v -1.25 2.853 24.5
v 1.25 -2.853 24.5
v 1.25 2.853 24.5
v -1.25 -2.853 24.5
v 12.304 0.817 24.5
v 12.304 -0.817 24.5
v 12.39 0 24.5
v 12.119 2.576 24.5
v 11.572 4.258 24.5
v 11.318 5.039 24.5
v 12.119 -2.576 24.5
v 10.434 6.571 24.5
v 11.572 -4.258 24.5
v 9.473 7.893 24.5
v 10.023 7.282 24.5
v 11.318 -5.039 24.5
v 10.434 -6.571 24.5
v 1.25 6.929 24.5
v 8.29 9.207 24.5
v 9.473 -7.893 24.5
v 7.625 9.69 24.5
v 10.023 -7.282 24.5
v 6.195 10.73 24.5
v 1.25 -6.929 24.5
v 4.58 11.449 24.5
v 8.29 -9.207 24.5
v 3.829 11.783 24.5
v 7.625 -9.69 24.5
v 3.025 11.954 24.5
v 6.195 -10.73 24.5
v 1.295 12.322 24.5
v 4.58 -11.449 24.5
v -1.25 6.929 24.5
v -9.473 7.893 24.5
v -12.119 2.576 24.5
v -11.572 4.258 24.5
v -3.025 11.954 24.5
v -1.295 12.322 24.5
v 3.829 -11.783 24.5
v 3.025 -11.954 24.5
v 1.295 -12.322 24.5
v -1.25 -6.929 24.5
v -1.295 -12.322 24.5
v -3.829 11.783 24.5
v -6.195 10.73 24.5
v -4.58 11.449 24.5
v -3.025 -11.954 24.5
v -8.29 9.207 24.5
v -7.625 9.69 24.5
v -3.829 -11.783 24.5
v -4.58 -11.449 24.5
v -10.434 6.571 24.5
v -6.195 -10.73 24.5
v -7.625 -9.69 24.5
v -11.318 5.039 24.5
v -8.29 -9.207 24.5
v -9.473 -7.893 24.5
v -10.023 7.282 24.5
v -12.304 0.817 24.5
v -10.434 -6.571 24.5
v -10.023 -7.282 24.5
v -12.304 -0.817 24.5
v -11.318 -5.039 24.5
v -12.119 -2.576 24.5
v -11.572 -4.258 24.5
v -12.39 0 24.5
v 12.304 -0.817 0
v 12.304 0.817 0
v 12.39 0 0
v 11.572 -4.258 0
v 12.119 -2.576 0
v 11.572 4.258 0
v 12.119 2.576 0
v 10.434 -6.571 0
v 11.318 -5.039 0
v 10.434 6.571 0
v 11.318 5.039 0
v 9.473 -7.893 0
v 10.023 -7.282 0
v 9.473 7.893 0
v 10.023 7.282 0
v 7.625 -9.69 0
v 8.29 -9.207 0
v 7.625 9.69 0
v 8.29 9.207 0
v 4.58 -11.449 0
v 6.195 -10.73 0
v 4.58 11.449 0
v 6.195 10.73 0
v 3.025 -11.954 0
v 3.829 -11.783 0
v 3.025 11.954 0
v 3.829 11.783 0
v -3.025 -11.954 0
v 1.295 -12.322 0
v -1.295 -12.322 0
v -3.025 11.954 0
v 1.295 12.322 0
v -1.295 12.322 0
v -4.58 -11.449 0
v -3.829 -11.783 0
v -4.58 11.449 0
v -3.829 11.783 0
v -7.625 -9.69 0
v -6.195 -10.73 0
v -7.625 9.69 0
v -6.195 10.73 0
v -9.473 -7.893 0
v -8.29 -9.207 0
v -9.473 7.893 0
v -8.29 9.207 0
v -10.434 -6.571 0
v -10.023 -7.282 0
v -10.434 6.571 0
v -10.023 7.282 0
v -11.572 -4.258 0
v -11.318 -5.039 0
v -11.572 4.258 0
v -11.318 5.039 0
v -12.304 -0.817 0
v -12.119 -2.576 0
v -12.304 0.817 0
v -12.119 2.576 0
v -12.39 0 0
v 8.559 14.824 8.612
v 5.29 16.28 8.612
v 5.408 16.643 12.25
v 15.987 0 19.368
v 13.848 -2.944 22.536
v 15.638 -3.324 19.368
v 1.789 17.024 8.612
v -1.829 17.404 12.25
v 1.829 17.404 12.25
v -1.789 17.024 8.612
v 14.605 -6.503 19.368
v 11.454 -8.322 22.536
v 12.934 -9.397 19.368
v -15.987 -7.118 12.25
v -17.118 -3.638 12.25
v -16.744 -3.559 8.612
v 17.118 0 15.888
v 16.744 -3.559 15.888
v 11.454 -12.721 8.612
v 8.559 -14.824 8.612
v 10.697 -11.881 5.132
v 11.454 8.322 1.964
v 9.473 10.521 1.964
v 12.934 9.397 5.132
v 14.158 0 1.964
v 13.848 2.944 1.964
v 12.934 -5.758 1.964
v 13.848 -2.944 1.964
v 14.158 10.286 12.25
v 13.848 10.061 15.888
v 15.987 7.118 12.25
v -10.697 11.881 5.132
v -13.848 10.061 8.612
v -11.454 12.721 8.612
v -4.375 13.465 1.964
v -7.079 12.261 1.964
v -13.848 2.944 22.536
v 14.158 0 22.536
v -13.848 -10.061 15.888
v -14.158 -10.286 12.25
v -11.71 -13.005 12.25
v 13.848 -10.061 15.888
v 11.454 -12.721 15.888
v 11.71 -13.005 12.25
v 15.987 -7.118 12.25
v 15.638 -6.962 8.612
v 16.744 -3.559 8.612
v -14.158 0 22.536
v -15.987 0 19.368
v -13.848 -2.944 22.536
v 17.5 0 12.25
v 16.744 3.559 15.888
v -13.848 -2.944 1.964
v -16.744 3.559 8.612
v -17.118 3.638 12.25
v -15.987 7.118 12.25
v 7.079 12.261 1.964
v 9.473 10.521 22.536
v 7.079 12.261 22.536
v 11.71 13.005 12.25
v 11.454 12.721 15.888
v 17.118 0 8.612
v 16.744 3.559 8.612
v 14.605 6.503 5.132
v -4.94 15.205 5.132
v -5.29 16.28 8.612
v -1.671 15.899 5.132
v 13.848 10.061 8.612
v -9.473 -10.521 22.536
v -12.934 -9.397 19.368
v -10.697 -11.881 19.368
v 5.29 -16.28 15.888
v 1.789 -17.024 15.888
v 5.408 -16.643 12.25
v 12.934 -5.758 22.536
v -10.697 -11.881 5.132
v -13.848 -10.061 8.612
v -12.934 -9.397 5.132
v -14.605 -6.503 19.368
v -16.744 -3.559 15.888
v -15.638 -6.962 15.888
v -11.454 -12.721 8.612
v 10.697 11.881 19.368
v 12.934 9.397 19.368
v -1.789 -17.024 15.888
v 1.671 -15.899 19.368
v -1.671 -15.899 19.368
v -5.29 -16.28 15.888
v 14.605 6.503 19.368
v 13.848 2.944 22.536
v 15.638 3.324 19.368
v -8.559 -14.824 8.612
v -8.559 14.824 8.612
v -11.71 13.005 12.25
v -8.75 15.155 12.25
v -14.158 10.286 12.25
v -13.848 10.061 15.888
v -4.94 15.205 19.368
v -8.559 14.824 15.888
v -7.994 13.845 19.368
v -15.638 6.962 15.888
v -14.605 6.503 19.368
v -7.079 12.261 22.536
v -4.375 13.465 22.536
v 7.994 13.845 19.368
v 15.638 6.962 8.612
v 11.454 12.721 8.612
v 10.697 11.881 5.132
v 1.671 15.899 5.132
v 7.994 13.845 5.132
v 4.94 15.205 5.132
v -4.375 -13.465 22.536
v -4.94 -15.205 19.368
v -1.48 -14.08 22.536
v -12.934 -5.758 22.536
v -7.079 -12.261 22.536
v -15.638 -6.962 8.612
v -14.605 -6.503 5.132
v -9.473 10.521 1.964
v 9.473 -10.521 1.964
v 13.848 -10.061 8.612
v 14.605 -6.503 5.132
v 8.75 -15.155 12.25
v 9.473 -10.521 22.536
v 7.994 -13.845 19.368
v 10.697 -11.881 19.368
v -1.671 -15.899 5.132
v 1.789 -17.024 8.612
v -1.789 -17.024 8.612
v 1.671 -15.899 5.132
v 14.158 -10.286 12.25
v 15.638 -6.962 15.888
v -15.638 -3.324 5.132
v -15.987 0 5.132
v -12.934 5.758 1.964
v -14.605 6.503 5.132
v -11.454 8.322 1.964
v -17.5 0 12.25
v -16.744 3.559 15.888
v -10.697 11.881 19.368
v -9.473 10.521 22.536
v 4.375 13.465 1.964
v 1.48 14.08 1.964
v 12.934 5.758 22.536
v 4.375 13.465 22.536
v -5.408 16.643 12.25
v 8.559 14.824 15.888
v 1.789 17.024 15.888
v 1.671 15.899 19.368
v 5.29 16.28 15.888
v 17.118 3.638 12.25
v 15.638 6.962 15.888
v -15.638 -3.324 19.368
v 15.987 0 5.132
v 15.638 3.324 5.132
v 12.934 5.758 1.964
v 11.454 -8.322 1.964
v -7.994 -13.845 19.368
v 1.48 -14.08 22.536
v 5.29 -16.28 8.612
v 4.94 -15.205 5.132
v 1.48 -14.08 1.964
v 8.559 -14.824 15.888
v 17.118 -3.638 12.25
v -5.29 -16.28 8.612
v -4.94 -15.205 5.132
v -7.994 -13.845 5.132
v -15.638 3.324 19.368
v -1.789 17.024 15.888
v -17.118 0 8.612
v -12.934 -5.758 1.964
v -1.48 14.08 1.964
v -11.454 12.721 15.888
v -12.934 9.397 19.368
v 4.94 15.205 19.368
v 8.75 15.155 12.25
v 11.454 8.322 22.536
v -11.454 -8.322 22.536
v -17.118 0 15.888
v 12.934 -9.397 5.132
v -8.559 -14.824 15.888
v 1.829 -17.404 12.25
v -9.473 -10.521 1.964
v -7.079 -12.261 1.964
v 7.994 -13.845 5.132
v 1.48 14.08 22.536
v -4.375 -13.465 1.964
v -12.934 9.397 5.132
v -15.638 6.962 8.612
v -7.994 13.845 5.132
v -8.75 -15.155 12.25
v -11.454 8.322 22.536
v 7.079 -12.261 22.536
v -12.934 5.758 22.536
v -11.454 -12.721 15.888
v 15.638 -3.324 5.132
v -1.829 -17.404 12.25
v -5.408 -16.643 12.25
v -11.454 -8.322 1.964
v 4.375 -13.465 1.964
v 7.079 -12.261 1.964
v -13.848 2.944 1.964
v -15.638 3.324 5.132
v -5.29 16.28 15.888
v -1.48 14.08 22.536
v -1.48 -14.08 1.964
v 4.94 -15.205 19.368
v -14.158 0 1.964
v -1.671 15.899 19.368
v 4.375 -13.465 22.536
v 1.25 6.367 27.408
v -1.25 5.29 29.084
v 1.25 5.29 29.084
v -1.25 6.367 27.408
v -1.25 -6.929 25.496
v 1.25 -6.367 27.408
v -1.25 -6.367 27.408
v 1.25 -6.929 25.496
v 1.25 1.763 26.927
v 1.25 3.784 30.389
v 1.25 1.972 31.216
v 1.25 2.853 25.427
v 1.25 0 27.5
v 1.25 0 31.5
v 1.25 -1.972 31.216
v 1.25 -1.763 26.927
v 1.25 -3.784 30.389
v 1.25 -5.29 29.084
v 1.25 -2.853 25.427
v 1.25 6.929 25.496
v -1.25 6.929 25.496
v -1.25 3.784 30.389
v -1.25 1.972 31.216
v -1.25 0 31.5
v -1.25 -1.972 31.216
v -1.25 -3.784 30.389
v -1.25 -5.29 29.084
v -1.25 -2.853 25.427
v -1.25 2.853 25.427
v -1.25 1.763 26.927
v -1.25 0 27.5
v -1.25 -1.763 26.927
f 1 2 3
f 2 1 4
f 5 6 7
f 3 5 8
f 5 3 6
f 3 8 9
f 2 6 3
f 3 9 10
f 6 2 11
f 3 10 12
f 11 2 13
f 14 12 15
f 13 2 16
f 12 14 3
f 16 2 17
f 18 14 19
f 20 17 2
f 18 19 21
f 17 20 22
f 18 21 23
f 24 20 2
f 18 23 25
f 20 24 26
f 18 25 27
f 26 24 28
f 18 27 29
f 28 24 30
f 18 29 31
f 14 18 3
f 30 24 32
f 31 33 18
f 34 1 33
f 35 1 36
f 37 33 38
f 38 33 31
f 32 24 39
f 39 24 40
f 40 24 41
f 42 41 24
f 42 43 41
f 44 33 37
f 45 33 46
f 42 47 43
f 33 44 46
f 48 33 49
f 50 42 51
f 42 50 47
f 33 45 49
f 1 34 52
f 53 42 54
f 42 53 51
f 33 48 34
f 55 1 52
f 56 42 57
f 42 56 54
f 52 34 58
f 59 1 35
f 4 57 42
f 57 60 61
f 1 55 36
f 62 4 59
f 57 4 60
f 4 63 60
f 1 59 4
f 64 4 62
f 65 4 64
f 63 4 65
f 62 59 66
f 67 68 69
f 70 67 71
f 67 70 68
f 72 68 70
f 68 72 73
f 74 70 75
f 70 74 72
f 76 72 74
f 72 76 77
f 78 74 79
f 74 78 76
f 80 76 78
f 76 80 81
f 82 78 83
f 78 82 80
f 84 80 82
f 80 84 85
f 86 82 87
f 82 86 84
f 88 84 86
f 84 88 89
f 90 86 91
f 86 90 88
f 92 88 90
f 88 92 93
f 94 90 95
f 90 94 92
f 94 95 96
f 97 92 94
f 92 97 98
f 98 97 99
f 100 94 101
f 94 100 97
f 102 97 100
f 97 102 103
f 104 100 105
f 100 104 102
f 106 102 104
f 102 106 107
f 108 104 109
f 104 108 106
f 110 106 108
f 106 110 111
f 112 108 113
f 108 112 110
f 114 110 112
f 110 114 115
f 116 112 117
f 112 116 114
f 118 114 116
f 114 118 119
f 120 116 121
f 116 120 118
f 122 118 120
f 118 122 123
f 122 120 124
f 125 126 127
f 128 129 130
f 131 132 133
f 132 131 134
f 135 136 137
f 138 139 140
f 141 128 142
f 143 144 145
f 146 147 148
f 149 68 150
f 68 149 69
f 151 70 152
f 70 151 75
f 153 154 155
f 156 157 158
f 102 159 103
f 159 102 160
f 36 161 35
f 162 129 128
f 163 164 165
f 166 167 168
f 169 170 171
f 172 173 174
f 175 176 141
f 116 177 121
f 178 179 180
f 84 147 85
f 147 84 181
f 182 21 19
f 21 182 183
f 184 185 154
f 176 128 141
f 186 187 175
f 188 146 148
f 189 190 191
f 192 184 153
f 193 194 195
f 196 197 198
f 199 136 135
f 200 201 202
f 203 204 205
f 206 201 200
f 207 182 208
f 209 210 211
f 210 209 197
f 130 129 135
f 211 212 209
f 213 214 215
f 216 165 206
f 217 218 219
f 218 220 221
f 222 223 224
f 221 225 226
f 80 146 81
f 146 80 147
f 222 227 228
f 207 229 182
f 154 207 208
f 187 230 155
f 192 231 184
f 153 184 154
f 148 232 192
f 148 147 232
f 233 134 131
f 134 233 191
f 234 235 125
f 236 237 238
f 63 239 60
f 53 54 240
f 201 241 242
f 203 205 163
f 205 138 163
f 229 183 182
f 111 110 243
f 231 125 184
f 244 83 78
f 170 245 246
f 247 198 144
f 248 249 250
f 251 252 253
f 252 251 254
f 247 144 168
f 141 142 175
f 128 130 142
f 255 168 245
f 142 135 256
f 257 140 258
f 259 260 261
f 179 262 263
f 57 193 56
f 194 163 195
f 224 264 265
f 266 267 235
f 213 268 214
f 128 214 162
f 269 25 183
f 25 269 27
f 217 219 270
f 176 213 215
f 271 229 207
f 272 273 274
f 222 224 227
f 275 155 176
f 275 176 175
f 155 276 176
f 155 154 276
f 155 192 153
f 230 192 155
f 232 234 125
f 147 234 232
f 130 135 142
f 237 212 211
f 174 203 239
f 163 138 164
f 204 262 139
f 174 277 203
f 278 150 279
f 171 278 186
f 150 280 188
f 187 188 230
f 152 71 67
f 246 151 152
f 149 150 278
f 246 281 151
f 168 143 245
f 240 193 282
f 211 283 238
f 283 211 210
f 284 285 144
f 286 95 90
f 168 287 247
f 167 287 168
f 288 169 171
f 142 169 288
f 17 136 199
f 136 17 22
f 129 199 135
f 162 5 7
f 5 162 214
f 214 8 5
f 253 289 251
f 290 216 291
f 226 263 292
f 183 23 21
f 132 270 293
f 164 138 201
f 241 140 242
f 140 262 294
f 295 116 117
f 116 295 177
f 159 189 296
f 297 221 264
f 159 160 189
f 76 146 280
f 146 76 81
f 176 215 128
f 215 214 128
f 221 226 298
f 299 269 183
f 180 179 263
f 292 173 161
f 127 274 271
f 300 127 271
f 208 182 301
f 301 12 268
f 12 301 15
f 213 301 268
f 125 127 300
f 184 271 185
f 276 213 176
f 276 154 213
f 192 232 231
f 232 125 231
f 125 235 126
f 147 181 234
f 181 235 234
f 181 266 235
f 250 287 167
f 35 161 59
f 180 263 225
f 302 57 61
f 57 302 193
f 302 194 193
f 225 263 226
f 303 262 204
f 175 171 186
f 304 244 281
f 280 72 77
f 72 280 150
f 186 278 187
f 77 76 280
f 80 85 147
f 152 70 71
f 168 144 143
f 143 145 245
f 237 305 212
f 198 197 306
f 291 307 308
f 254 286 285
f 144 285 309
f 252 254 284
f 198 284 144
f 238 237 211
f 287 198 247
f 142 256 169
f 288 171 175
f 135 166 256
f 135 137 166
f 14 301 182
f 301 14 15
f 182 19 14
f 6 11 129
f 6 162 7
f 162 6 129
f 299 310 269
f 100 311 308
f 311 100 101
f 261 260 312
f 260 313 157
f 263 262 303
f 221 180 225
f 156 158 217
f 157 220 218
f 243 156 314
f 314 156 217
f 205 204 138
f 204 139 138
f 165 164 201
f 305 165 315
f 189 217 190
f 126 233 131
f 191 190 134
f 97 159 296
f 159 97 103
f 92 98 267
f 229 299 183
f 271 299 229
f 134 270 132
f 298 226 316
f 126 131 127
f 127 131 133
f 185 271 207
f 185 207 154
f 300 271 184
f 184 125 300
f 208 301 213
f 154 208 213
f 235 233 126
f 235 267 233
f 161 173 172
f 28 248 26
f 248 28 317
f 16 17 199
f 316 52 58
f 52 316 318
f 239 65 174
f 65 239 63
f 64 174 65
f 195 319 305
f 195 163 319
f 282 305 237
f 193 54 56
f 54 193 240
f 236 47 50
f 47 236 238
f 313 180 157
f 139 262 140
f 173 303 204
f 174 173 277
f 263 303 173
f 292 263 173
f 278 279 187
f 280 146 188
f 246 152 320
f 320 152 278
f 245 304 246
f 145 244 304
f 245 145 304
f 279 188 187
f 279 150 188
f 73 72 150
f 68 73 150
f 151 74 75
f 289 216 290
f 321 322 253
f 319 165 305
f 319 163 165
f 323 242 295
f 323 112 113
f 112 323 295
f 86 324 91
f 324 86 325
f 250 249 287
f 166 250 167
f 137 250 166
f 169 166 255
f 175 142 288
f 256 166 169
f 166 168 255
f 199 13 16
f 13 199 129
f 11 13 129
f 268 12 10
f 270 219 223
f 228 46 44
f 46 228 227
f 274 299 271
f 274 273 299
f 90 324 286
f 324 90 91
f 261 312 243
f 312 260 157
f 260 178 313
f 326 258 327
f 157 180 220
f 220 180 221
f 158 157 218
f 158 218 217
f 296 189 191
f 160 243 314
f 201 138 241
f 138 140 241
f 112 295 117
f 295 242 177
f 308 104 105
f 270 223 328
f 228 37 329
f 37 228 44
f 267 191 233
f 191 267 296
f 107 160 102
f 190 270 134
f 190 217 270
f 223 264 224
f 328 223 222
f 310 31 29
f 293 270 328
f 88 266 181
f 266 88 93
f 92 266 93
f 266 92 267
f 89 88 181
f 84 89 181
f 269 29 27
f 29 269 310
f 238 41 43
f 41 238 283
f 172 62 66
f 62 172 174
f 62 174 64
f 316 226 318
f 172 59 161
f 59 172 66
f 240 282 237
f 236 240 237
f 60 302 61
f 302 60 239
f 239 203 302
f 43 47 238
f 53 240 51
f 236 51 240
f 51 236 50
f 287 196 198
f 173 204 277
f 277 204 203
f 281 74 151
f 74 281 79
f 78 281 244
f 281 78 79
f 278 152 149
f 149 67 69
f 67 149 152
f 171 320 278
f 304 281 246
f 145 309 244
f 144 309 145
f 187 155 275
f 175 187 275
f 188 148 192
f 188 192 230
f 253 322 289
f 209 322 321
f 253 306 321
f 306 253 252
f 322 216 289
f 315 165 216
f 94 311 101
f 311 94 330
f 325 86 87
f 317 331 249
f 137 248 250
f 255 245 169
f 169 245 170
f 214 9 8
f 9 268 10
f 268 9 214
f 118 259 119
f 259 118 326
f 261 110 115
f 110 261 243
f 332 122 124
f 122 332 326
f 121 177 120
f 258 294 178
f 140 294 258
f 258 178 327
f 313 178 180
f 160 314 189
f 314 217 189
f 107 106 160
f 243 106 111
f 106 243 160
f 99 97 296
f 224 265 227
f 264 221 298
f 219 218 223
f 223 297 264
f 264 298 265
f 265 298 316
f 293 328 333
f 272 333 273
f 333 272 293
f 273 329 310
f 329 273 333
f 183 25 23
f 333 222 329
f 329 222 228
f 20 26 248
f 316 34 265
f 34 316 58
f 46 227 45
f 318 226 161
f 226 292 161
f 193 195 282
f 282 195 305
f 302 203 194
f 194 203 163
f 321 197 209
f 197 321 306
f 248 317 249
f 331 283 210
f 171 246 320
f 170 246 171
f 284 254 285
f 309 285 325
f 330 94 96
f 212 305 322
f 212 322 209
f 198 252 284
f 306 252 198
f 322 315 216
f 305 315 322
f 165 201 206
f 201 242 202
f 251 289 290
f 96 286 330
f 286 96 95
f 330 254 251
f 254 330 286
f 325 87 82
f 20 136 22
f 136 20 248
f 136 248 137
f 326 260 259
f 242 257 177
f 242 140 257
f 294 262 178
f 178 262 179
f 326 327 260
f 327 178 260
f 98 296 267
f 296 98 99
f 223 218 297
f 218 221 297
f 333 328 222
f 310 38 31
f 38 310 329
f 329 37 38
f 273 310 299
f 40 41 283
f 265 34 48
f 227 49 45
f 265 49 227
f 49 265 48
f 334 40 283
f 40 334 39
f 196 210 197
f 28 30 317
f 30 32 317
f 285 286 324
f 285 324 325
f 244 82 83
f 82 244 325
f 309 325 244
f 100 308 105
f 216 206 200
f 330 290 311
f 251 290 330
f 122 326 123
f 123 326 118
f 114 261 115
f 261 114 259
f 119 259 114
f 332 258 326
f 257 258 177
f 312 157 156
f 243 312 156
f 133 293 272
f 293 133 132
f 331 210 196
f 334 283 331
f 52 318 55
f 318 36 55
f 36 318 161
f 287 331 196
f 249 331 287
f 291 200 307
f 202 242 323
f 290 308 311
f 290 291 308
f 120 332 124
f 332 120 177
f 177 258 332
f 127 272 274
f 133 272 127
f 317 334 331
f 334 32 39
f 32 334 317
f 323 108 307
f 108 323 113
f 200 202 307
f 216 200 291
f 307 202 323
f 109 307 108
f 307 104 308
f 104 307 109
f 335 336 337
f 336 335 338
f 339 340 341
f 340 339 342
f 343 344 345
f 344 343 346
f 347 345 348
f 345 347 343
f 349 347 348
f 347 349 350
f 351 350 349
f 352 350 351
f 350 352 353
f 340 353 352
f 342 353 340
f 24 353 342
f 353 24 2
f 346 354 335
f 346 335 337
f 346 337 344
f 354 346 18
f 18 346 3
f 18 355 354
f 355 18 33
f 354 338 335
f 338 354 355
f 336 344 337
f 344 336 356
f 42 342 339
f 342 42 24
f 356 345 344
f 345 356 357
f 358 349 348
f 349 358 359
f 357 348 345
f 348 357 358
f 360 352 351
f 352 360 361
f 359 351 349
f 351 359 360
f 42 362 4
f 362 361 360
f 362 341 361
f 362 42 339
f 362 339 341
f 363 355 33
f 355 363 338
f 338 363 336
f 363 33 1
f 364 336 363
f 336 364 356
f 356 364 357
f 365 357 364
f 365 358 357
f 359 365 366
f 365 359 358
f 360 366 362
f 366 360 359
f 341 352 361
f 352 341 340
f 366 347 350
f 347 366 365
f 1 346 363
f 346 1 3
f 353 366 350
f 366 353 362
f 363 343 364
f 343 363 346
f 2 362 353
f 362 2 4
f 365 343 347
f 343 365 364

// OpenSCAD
// Weight for a doorbell
//
// This is basically a way to waste some material,
// with a ring on top for the string.

module washer (th) {
  rotate(90, [0, 1, 0]) {
    translate ([0, 0, -th/2]) {
      difference () {
        cylinder(th, th*2.8, th*2.8);
        translate([0, 0, -0.1])
          cylinder(th + 0.2, th*1.2, th*1.2);
      }
    }
  }
}

module weight (dia) {
  intersection () {
    cylinder(dia*0.7, dia/2, dia/2);
    translate([0, 0, dia*0.35])
      sphere(dia/2);
  }

  translate([0, 0, dia*0.7])
    washer(2.5);
}

weight(35);
